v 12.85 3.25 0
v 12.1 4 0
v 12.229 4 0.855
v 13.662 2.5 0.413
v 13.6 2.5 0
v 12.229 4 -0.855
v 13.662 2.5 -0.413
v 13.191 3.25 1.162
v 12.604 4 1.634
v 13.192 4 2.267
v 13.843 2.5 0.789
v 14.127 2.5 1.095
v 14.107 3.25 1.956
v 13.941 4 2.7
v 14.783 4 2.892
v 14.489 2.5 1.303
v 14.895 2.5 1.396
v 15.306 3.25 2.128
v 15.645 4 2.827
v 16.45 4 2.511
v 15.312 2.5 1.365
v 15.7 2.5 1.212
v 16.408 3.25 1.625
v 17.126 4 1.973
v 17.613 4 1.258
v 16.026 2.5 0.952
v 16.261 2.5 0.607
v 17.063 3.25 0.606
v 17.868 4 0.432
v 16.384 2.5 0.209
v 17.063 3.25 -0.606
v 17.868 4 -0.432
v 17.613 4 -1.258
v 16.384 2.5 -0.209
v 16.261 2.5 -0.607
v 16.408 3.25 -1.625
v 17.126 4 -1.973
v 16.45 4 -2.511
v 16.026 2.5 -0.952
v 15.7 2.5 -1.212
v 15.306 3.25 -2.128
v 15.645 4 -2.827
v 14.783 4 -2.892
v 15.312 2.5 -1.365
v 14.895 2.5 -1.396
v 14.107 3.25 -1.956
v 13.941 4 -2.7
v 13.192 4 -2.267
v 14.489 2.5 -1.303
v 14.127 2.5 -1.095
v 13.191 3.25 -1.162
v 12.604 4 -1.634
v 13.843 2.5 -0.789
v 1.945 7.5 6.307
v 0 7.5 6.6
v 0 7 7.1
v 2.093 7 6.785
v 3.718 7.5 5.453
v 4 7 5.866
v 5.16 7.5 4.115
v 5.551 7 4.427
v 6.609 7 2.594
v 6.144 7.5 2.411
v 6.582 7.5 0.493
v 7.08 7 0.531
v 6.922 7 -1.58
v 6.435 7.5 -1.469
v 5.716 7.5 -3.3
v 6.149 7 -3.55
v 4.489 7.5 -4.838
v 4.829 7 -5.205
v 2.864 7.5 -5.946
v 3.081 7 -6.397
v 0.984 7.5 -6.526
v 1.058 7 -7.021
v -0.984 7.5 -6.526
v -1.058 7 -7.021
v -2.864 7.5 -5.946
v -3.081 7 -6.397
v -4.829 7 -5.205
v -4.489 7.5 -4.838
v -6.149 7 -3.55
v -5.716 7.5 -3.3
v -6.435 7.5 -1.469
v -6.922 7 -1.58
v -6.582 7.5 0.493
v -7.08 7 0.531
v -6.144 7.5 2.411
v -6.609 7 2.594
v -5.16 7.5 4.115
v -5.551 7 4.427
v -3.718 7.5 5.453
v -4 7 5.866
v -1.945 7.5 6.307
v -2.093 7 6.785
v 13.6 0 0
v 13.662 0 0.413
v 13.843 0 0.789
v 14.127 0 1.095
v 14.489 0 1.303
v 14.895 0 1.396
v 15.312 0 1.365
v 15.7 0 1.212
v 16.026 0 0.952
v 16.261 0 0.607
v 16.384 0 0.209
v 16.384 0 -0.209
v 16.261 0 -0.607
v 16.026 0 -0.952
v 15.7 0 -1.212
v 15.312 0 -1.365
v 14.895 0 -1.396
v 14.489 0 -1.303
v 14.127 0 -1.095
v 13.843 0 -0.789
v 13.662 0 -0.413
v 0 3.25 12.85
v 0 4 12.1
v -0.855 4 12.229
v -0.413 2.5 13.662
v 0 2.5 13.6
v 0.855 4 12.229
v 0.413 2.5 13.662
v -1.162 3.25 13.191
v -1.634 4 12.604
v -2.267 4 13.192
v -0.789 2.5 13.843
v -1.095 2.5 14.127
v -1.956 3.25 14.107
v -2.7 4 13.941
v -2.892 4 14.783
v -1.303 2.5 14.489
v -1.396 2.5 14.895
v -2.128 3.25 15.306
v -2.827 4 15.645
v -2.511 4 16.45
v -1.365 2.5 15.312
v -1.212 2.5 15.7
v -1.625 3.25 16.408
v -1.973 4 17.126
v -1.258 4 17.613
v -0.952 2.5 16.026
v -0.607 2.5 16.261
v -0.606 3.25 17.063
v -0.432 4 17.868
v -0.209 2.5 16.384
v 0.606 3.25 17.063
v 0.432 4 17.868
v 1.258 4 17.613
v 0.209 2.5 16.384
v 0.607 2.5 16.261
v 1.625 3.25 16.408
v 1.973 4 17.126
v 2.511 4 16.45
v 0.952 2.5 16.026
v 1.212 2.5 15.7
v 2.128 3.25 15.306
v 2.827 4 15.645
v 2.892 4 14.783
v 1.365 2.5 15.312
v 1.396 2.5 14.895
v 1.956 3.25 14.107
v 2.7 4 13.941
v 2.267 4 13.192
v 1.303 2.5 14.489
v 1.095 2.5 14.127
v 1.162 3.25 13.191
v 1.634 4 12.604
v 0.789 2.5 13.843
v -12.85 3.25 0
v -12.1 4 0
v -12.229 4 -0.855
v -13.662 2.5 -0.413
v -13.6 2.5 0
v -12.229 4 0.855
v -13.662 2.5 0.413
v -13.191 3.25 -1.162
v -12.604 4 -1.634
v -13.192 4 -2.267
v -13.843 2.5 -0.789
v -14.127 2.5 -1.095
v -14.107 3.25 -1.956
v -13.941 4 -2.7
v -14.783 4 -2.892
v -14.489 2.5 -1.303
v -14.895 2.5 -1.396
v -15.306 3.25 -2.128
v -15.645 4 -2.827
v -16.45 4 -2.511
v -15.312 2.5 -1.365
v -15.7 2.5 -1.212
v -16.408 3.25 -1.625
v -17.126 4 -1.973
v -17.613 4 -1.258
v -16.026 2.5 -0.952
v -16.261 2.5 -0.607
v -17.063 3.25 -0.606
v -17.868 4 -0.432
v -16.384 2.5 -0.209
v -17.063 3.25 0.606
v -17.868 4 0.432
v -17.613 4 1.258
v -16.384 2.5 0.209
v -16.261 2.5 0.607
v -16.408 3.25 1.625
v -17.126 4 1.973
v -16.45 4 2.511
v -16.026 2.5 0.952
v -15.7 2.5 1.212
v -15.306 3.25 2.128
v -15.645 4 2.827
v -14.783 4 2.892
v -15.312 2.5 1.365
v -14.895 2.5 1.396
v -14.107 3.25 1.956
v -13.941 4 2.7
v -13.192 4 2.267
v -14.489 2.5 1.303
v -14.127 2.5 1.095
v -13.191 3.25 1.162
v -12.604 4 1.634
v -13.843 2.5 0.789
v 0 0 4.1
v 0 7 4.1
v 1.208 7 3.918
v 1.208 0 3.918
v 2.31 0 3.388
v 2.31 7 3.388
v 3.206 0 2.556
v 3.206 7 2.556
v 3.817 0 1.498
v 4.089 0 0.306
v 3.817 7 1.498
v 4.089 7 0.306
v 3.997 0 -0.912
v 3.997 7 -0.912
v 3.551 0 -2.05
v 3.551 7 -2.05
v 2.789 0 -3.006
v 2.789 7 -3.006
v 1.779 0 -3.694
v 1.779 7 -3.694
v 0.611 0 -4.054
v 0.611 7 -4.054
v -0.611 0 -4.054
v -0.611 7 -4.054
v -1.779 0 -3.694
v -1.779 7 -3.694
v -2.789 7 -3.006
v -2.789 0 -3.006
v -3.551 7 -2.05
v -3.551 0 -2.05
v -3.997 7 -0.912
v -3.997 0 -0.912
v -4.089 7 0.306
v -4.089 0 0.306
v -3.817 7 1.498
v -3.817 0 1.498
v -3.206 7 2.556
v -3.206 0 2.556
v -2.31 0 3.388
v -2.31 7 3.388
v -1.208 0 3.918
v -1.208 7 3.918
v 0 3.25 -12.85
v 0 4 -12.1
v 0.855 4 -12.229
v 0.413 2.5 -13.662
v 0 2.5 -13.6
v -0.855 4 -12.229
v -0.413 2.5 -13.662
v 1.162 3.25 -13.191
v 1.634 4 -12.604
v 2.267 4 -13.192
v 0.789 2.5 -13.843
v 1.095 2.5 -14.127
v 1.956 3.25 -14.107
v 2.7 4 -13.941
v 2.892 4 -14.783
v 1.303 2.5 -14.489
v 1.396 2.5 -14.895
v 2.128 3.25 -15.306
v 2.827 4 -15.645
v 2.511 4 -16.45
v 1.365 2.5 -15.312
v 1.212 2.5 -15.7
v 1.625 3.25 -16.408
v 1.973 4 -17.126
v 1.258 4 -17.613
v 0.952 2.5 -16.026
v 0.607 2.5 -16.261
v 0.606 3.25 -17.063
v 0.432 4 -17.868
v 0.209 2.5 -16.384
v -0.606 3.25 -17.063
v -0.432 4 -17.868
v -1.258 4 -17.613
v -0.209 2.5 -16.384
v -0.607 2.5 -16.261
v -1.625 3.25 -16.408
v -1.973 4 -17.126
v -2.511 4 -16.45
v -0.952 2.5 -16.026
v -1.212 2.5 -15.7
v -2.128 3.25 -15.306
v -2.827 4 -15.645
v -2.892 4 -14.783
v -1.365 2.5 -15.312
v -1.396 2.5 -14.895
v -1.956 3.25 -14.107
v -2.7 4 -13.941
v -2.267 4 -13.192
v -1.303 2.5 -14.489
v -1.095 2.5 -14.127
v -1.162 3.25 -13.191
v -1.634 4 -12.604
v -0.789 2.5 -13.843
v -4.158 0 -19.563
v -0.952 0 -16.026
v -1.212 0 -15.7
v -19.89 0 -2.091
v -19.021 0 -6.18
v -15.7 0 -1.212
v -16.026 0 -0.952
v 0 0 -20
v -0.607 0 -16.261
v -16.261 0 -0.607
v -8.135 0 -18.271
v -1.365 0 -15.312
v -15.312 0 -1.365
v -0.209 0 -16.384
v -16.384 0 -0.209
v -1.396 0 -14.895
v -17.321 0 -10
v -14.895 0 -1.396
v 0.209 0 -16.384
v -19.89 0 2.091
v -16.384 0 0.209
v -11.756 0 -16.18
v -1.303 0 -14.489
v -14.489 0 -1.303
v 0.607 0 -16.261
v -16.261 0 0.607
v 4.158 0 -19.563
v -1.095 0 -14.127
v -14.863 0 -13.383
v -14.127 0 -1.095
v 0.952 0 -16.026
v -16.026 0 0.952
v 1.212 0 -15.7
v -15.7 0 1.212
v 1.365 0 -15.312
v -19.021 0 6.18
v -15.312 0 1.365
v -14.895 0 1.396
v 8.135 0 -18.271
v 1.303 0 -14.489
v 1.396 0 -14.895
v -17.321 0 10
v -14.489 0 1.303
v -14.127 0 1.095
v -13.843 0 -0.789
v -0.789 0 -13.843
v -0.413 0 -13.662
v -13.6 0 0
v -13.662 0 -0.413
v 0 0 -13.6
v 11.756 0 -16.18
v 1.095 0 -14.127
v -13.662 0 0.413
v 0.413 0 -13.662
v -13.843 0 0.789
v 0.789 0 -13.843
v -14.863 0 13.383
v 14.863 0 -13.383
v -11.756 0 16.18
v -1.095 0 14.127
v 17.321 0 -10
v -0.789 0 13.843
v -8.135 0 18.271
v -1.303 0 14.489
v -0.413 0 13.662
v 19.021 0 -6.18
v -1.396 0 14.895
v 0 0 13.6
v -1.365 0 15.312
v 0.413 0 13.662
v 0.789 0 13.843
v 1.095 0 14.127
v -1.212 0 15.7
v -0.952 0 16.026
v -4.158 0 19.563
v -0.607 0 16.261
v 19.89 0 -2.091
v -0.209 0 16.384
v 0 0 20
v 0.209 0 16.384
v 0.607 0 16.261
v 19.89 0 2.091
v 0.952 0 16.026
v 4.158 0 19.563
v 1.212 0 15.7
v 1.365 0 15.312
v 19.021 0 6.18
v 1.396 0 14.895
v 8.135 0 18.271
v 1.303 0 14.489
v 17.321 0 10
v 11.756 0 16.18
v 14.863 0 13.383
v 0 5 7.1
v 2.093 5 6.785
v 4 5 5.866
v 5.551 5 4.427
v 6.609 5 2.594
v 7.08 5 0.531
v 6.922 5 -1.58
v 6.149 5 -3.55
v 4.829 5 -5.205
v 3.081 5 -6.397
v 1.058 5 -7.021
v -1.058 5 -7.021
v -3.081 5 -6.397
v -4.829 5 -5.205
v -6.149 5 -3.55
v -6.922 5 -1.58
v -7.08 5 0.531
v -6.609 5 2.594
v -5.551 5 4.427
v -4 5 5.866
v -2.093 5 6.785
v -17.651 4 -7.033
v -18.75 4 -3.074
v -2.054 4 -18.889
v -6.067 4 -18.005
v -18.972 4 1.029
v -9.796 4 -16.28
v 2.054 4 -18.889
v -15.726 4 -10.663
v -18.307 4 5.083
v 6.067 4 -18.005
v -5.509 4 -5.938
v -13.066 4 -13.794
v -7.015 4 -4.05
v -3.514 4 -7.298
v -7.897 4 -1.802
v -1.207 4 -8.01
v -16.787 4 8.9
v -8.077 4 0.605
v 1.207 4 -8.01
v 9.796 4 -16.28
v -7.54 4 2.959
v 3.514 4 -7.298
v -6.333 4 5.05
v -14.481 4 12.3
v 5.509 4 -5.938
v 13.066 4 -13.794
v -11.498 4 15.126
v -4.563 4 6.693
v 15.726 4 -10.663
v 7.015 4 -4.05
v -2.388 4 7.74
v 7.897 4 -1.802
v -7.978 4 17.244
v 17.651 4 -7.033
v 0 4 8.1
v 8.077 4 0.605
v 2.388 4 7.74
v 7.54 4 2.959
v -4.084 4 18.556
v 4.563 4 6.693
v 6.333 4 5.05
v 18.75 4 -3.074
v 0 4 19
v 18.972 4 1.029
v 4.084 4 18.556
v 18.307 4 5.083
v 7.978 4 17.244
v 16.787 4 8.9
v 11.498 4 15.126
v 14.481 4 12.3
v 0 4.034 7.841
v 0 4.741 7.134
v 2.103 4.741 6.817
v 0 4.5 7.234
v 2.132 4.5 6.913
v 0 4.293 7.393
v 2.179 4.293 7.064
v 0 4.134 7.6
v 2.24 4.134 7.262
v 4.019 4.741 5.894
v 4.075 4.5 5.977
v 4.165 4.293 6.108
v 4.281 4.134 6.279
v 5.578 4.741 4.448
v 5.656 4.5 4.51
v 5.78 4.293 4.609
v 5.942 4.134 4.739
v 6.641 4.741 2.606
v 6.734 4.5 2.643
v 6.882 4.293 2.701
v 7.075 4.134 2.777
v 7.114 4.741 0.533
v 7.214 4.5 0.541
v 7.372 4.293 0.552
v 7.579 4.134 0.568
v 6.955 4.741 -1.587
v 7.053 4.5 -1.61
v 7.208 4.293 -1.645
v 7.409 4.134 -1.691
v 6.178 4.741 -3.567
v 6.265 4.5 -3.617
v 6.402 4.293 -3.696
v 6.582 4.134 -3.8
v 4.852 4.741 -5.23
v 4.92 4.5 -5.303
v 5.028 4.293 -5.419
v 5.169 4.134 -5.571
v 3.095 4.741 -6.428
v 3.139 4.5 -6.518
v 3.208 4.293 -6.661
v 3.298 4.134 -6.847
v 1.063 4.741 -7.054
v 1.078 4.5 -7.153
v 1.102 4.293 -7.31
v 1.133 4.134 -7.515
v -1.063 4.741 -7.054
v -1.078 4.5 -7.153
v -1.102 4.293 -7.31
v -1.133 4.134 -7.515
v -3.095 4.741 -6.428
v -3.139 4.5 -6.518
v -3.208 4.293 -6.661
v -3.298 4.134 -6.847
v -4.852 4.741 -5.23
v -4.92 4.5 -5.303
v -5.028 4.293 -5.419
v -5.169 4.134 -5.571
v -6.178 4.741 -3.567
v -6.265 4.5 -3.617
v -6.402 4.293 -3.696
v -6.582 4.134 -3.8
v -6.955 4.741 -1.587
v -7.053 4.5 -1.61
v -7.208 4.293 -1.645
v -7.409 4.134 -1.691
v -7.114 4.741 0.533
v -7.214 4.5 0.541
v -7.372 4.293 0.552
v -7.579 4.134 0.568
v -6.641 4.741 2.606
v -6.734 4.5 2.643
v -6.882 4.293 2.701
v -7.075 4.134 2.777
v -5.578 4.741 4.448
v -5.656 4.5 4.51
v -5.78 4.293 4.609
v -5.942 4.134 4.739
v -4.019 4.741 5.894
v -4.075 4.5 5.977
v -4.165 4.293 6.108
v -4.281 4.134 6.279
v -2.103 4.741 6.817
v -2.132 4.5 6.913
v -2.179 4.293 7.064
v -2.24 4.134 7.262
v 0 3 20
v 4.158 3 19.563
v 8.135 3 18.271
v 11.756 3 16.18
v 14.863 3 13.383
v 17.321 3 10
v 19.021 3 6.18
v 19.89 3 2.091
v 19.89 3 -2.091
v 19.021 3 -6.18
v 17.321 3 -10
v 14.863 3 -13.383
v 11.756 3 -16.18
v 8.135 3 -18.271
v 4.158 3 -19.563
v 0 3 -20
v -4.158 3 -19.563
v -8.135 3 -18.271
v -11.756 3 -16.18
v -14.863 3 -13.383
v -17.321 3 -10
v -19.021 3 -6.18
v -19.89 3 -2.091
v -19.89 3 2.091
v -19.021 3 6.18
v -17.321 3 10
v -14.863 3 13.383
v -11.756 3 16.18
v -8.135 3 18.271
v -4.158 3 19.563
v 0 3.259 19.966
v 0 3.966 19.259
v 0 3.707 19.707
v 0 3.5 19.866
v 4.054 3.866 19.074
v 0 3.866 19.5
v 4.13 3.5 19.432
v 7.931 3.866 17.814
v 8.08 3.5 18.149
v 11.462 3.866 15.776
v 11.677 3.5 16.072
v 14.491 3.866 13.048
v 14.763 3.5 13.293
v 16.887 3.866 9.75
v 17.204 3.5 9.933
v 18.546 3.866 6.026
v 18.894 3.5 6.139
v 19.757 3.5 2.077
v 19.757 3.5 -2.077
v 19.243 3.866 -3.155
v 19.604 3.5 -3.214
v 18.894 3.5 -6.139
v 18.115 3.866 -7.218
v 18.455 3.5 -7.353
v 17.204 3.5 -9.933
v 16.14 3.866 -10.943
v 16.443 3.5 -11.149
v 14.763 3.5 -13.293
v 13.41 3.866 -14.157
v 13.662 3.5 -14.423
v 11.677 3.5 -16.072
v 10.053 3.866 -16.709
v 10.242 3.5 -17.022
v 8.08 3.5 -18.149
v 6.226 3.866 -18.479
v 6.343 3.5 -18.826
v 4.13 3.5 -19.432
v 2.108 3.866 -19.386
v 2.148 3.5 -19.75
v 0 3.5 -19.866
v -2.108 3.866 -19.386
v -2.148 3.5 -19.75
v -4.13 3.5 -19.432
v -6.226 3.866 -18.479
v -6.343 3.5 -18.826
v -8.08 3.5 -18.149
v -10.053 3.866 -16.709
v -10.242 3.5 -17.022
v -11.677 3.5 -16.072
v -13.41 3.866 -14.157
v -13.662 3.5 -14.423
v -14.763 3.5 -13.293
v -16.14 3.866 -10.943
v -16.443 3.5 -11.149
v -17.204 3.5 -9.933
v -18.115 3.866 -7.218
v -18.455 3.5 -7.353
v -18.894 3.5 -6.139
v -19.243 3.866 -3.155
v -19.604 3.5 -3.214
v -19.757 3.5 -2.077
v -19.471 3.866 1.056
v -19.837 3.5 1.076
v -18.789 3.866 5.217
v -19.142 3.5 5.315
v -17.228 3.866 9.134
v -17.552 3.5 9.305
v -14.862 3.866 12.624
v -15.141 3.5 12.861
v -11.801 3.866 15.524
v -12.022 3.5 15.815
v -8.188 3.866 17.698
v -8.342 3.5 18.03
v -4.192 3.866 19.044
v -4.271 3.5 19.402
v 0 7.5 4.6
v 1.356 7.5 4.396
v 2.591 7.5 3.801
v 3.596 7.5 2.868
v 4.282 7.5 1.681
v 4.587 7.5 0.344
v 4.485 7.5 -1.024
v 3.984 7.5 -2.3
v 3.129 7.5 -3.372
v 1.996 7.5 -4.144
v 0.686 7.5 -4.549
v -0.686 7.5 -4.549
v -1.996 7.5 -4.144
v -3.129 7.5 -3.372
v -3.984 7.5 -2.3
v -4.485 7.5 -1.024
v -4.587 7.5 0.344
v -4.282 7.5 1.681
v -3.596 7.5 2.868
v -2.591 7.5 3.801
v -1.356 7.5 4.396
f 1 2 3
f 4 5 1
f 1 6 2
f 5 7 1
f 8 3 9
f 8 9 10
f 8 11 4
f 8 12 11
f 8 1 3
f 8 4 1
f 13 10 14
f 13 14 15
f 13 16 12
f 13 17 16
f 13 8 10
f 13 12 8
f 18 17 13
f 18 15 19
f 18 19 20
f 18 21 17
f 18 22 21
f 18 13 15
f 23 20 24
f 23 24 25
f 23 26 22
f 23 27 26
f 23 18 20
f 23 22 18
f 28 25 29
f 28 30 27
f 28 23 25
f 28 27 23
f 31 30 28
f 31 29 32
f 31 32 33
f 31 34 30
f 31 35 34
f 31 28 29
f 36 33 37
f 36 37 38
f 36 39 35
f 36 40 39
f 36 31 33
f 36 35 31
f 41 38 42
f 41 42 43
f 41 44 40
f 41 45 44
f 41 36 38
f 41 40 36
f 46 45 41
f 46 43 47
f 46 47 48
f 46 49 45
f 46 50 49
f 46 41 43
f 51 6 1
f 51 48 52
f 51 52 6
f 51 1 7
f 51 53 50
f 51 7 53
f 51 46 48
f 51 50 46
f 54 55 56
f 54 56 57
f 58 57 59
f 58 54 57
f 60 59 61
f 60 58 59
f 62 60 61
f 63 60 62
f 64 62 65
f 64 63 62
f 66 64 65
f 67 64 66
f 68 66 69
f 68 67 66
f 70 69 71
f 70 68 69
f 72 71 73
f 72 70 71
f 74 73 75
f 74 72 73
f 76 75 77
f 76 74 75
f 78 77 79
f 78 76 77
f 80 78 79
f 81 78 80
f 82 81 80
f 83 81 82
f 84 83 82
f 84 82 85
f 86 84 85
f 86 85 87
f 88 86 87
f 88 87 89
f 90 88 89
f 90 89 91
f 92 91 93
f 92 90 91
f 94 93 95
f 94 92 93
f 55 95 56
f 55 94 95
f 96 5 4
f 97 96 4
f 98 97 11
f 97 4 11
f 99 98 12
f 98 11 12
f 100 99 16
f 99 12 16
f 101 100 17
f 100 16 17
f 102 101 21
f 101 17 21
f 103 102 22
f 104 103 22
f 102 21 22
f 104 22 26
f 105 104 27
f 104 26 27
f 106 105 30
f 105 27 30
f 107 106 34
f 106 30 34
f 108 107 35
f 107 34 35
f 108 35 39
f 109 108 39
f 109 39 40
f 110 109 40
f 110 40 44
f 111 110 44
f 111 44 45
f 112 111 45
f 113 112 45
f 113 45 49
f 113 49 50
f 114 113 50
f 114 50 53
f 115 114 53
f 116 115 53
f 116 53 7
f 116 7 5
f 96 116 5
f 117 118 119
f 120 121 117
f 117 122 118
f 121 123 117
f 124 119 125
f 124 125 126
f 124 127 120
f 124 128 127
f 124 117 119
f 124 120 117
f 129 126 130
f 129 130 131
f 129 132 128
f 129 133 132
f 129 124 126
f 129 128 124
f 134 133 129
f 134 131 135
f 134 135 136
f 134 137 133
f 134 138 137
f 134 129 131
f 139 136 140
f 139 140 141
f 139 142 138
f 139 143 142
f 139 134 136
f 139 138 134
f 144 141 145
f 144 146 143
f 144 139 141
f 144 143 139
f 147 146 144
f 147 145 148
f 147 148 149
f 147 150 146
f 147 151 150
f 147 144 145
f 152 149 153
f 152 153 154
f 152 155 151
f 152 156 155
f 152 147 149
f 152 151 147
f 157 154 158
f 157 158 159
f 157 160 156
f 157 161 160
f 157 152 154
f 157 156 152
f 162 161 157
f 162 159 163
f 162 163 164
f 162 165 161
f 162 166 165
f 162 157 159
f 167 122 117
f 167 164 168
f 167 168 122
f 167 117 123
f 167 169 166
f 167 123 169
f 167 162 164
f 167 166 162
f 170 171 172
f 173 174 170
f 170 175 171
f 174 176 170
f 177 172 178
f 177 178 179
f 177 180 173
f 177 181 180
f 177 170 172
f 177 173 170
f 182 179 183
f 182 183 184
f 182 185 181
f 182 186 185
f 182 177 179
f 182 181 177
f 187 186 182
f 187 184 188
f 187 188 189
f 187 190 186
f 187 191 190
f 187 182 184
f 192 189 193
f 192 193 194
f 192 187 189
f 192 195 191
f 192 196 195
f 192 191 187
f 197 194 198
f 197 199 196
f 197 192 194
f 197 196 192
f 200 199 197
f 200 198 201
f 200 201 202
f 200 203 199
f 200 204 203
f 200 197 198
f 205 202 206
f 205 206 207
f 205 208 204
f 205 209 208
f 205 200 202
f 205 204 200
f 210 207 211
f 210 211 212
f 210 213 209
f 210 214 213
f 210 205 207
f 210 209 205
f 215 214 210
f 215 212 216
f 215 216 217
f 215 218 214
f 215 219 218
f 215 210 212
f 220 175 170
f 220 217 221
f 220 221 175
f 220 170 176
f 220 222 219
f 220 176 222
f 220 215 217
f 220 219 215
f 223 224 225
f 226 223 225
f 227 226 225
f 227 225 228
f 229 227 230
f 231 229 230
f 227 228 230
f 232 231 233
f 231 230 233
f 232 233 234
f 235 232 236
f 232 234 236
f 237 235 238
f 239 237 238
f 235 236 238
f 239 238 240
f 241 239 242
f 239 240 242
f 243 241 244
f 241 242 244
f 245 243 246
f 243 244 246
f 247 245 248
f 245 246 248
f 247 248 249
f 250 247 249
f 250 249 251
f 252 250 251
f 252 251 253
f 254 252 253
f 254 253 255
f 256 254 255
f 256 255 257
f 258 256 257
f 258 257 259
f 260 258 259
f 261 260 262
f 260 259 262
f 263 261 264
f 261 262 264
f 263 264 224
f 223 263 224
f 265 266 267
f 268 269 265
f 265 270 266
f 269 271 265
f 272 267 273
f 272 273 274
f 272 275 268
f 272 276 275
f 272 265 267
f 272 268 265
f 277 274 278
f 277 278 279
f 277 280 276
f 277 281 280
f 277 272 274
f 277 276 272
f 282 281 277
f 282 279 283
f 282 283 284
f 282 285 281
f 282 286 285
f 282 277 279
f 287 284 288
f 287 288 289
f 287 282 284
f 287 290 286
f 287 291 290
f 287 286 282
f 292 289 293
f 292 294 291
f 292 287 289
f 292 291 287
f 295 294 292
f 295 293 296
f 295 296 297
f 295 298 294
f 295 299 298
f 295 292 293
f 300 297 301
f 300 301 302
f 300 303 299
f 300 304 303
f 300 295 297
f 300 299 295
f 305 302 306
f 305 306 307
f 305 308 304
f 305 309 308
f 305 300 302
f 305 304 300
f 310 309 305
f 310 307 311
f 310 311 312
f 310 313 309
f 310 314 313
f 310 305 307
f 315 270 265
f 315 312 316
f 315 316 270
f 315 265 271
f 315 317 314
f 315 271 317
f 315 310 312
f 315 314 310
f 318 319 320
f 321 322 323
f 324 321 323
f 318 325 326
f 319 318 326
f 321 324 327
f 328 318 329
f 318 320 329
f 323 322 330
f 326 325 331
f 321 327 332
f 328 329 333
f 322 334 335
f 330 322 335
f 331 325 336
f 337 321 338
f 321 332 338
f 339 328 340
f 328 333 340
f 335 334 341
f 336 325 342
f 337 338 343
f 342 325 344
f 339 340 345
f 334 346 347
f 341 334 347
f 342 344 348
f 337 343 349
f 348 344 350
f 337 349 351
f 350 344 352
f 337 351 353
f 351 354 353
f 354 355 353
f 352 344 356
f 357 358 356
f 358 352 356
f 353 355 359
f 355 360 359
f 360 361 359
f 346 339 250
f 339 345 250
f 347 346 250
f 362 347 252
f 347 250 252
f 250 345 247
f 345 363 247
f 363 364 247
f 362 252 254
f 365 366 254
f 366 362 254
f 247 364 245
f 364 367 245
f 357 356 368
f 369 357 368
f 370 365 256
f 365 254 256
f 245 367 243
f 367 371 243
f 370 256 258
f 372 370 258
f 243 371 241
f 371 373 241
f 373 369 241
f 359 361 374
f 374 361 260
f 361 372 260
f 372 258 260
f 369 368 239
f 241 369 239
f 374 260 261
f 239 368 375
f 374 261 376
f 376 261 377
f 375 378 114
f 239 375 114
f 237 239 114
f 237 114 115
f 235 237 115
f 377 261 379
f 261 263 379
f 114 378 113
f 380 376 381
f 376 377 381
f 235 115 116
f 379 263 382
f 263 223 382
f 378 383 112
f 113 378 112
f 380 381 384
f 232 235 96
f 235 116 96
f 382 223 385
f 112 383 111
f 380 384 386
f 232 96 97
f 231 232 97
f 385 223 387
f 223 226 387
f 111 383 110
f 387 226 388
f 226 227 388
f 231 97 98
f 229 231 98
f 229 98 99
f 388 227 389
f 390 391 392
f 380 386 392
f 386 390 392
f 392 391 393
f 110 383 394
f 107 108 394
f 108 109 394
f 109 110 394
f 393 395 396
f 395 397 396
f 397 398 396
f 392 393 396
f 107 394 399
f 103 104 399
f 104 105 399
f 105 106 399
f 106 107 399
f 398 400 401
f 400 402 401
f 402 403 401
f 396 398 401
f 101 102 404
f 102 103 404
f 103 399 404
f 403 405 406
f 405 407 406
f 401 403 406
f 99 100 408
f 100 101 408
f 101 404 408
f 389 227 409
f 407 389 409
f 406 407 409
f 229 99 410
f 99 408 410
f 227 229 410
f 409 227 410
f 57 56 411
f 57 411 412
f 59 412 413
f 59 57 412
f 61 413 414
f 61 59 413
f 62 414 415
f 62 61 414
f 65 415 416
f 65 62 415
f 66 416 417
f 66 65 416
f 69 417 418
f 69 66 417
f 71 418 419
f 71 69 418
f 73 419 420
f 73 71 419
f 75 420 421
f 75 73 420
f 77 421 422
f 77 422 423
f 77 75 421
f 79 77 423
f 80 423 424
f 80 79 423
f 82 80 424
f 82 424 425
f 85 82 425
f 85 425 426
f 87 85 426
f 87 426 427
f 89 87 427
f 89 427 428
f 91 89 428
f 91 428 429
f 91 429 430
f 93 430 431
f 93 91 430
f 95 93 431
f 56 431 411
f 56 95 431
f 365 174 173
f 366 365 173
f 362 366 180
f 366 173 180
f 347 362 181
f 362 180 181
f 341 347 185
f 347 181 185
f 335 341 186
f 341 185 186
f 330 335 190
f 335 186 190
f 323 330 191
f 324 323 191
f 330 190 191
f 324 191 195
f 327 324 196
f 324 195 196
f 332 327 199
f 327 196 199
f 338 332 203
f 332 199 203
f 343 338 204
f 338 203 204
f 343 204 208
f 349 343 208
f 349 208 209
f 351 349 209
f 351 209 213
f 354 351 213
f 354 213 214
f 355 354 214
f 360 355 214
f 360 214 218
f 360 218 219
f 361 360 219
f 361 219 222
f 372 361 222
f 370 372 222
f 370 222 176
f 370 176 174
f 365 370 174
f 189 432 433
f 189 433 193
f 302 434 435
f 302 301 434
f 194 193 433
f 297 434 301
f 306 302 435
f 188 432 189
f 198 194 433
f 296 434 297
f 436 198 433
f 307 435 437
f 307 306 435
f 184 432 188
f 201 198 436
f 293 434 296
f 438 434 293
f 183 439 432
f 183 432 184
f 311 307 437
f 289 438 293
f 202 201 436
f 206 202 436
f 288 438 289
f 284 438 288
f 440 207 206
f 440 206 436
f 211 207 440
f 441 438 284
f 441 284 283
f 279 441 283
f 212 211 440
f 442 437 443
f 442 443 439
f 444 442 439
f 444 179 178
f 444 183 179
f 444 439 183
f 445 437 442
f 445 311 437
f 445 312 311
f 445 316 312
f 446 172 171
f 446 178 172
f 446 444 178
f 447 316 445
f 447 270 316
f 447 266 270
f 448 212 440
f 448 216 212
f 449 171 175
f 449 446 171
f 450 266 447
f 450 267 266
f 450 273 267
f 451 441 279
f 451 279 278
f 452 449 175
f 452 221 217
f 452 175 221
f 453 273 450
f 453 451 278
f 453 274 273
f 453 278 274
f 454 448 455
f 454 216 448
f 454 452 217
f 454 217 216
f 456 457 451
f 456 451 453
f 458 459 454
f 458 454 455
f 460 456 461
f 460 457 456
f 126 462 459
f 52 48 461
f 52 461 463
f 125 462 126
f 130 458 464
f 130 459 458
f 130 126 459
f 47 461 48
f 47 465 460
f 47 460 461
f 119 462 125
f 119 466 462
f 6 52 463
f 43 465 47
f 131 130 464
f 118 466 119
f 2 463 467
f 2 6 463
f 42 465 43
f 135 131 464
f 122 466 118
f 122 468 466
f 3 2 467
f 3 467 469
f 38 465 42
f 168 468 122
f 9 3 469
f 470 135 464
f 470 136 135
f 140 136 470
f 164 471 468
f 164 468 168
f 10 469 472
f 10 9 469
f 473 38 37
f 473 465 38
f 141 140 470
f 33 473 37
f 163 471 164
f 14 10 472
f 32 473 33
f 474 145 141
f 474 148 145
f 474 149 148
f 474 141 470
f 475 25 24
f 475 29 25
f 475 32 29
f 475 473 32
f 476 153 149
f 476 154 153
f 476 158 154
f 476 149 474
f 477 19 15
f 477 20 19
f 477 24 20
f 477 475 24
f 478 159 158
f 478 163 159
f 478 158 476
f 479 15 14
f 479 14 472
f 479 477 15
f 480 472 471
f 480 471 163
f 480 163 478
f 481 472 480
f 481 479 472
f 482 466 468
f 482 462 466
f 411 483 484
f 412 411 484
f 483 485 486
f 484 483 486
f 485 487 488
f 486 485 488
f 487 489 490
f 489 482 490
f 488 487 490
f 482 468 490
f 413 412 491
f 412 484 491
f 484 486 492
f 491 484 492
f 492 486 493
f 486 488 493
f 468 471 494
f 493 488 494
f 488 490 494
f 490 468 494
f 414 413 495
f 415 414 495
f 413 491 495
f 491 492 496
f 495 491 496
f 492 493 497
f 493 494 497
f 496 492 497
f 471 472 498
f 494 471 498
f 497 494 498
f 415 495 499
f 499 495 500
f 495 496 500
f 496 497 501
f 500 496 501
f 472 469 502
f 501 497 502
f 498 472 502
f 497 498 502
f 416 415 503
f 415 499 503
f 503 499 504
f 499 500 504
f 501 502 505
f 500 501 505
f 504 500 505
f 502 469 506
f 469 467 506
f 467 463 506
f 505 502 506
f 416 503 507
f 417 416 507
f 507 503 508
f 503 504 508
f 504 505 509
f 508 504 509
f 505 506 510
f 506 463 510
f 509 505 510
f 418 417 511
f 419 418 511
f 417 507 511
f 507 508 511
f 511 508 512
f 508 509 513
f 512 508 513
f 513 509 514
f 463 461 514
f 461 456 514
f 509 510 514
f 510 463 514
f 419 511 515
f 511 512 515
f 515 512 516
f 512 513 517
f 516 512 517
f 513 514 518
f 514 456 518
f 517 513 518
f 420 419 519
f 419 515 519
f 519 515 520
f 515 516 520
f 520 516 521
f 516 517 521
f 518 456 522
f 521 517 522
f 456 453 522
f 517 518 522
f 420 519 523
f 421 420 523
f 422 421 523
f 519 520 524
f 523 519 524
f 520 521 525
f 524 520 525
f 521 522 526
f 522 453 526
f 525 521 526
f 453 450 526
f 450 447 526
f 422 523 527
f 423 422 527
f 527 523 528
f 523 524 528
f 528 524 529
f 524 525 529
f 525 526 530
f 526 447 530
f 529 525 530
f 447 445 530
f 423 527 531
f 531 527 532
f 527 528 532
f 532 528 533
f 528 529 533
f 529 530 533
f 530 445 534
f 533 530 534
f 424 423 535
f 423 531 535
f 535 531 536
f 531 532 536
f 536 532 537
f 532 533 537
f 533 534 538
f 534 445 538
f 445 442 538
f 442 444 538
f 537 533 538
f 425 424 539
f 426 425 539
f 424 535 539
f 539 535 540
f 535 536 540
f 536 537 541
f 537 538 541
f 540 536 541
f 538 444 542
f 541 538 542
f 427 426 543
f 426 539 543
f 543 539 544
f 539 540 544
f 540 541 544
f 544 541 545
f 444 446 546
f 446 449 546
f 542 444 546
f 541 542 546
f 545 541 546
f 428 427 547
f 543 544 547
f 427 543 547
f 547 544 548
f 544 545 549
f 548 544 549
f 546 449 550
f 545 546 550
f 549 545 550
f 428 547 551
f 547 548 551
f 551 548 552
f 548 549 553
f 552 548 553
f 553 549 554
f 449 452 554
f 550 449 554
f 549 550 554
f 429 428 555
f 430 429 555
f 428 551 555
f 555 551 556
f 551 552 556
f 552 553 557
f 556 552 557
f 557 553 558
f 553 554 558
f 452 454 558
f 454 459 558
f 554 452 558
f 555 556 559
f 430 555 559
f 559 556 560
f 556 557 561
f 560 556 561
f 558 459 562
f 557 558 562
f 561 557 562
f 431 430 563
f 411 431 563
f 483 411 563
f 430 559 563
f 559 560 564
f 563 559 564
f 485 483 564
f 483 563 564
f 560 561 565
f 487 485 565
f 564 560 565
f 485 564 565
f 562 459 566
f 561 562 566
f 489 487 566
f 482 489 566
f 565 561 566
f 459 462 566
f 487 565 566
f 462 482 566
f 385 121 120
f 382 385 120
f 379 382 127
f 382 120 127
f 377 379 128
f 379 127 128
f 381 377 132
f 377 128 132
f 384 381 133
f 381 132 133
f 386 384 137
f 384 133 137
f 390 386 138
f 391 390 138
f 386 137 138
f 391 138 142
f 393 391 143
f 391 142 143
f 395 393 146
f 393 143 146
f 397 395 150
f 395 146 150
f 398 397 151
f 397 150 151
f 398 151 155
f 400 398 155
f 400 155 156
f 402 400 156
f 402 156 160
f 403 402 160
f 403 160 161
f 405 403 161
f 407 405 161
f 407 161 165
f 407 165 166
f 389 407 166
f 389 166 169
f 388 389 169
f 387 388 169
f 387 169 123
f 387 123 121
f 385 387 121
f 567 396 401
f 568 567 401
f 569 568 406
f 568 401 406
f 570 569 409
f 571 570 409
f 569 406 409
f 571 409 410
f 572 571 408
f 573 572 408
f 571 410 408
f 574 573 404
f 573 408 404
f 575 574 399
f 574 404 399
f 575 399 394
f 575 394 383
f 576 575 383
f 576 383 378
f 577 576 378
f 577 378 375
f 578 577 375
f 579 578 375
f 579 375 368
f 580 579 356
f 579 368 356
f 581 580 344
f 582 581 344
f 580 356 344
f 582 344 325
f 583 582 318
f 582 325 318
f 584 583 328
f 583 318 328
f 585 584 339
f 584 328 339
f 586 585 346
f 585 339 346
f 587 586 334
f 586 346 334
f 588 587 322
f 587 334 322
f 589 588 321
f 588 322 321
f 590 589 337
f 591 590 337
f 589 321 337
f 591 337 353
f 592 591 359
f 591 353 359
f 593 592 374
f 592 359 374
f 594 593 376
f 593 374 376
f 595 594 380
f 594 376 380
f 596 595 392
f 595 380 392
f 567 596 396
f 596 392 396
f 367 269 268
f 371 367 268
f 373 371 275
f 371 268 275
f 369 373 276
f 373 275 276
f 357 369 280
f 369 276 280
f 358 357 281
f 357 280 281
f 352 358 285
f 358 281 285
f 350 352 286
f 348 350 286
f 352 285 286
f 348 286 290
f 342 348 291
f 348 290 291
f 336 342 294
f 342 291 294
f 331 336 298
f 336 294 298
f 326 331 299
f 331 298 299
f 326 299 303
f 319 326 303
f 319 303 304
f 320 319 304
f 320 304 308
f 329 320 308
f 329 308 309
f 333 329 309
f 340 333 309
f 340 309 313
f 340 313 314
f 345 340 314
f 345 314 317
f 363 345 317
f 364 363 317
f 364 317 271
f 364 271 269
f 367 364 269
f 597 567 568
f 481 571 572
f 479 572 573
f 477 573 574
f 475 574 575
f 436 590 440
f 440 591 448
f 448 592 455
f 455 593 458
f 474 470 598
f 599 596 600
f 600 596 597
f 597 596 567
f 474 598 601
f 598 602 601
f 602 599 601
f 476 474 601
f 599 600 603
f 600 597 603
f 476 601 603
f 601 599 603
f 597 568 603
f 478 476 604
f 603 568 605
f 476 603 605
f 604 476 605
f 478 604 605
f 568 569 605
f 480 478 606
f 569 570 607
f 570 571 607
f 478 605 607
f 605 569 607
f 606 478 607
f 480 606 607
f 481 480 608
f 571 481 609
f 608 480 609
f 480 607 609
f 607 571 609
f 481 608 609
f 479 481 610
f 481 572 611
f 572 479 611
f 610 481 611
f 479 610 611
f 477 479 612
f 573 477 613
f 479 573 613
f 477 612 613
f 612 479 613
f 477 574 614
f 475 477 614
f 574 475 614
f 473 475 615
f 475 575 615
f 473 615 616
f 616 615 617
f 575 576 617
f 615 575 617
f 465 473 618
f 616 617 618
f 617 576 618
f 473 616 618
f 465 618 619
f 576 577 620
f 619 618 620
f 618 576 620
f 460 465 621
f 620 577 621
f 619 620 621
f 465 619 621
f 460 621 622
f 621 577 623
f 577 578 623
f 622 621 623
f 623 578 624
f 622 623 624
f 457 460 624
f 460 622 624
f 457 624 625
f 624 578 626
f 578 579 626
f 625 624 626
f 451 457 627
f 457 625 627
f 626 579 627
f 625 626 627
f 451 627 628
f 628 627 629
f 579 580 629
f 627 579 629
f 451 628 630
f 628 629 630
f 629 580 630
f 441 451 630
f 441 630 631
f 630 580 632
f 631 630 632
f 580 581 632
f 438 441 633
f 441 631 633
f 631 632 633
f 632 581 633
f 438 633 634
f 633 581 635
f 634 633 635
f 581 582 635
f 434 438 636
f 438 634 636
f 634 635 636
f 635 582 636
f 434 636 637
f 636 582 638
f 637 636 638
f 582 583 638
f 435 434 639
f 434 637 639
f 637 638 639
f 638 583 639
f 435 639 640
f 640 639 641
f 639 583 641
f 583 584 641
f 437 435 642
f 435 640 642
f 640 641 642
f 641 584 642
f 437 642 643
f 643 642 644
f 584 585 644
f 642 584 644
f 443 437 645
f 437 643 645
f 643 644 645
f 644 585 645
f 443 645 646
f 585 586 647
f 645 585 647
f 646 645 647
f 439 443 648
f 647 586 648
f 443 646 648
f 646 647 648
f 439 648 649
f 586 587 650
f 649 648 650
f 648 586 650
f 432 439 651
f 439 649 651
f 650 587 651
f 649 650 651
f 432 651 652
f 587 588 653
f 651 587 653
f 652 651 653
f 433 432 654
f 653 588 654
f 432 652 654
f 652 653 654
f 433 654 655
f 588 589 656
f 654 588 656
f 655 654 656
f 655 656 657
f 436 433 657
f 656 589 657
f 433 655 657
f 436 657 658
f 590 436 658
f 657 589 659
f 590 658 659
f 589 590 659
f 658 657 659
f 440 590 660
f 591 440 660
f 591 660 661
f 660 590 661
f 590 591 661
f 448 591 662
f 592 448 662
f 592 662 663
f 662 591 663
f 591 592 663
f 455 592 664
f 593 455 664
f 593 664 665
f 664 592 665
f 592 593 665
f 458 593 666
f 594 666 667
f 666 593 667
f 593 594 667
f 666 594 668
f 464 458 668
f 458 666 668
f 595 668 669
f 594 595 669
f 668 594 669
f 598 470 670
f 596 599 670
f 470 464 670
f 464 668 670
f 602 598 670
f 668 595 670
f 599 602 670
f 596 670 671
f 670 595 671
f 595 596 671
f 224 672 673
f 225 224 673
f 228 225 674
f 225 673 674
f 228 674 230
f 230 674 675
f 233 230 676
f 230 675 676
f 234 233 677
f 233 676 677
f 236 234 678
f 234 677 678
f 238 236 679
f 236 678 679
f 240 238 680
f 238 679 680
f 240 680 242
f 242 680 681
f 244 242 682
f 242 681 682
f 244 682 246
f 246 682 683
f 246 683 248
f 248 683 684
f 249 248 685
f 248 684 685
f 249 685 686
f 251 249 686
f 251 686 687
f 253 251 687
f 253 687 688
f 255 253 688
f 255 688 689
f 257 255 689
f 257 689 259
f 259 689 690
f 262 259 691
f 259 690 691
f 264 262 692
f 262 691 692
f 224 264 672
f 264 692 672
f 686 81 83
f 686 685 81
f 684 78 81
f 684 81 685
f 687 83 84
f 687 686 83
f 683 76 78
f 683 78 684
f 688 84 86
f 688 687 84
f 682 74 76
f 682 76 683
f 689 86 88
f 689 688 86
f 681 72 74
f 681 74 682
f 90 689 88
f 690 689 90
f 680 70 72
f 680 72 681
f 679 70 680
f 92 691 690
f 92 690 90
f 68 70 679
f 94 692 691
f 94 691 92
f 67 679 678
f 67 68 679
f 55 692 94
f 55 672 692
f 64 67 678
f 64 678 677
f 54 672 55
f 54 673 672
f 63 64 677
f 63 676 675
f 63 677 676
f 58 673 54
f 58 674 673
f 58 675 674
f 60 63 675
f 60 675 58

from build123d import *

# Parameters (mm, degrees)
SKETCH1_R                    = 20
BOSS_EXTRUDE1_DEPTH          = 4
SKETCH2_R                    = 4.1
CUT_EXTRUDE1_DEPTH           = 29.565713714
SKETCH3_R                    = 1.4
CUT_EXTRUDE2_DEPTH           = 29.565713714
CHAMFER1_SIZE                = 1.5
CIRPATTERN1_COUNT            = 4
CHAMFER1_OF_CIRPATTERN1_SIZE = 1.5
FILLET1_R                    = 1
BOSS_EXTRUDE2_START          = 3.5
SKETCH4_R                    = 7.1
SKETCH4_R_2                  = 4.1
BOSS_EXTRUDE2_DEPTH          = 3.5
CHAMFER2_SIZE                = 0.5
FILLET2_R                    = 1
CHAMFER3_SIZE                = 0.5


with BuildPart() as part:
    # Sketch1 → Boss-Extrude1 (new body)
    with BuildSketch(Plane(origin=(0, 0, 0), x_dir=(1, 0, 0), z_dir=(0, 1, 0))):
        Circle(SKETCH1_R)
    extrude(amount=BOSS_EXTRUDE1_DEPTH)

    # Sketch2 → Cut-Extrude1 (cut, through all)
    with BuildSketch(Plane(origin=(0, 4, 0), x_dir=(1, 0, 0), z_dir=(0, 1, 0))):
        Circle(SKETCH2_R)
    extrude(amount=-CUT_EXTRUDE1_DEPTH, mode=Mode.SUBTRACT)

    # Sketch3 → Cut-Extrude2 (cut, through all)
    with BuildSketch(Plane(origin=(0, 4, 0), x_dir=(1, 0, 0), z_dir=(0, 1, 0))):
        with Locations((0, 15)):
            Circle(SKETCH3_R)
    cut_extrude2 = extrude(amount=-CUT_EXTRUDE2_DEPTH, mode=Mode.SUBTRACT)

    # Chamfer1
    chamfer1_edges = [part.edges().sort_by_distance(p)[0] for p in [
        (-1.4, 4, -15),
    ]]
    chamfer(chamfer1_edges, length=CHAMFER1_SIZE)

    # CirPattern1: Cut-Extrude2 ×4 about axis
    cirpattern1_axis = Axis((0, 0, 0), (0, 1, 0))
    for i in range(1, CIRPATTERN1_COUNT):
        add(cut_extrude2.rotate(cirpattern1_axis, i * 360 / CIRPATTERN1_COUNT), mode=Mode.SUBTRACT)

    # Chamfer1 of CirPattern1
    chamfer1_of_cirpattern1_edges = [part.edges().sort_by_distance(p)[0] for p in [
        (-15, 4, 1.4),
        (1.4, 4, 15),
        (15, 4, -1.4),
    ]]
    chamfer(chamfer1_of_cirpattern1_edges, length=CHAMFER1_OF_CIRPATTERN1_SIZE)

    # Fillet1
    fillet1_edges = [part.edges().sort_by_distance(p)[0] for p in [
        (-20, 4, 0),
    ]]
    fillet(fillet1_edges, radius=FILLET1_R)

    # Sketch4 → Boss-Extrude2 (add)
    with BuildSketch(Plane(origin=(0, 4, 0), x_dir=(1, 0, 0), z_dir=(0, 1, 0)).offset(BOSS_EXTRUDE2_START)):
        Circle(SKETCH4_R)
        Circle(SKETCH4_R_2, mode=Mode.SUBTRACT)
    extrude(amount=-BOSS_EXTRUDE2_DEPTH)

    # Chamfer2
    chamfer2_edges = [part.edges().sort_by_distance(p)[0] for p in [
        (-4.1, 7.5, 0),
    ]]
    chamfer(chamfer2_edges, length=CHAMFER2_SIZE)

    # Fillet2
    fillet2_edges = [part.edges().sort_by_distance(p)[0] for p in [
        (-7.1, 4, 0),
    ]]
    fillet(fillet2_edges, radius=FILLET2_R)

    # Chamfer3
    chamfer3_edges = [part.edges().sort_by_distance(p)[0] for p in [
        (-7.1, 7.5, 0),
    ]]
    chamfer(chamfer3_edges, length=CHAMFER3_SIZE)


solid = part.part
